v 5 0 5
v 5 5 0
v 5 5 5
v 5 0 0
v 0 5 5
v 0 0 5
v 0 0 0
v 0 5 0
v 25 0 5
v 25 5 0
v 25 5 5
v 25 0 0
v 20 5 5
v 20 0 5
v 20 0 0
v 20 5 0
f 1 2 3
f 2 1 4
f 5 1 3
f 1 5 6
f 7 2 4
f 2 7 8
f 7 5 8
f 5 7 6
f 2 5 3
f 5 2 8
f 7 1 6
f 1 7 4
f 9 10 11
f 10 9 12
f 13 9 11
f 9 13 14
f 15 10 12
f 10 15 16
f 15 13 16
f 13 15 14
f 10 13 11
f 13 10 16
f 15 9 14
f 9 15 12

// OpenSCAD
// Two bodies which do not touch. A CLOSED_SHELL has to be a single connected
// shell, so these have to end up as one MANIFOLD_SOLID_BREP each instead of
// being stuffed into one shell that can never close.
//
// Measured, and asserted by the driver: what the exporter has to report for
// the above to have happened. A silently faceted export is still a valid one,
// so validity alone cannot see a recogniser that has stopped recognising.
// Nothing curved is declared, as with step-cube. The plane count is eight
// rather than twelve, and that is this fixture's own arithmetic: the two boxes
// have the same extent in y and z and differ only along x, so their y = 0,
// y = 5, z = 0 and z = 5 faces lie in the same four planes and are one record
// each - Surface::sameAs compares a plane by the plane, not by the point it was
// anchored at. Four x planes at 0, 5, 20 and 25 and four shared ones is eight.
// EXPECT: 0 analytic surfaces available (0 cylindrical, 0 spherical, 0 toroidal, 0 Bezier), and 8 declared planes
//
// Two 5mm cubes, 125 each. The figure is what says both bodies survived: lose
// one and the kernel still reads a valid solid, of half the volume.
// ROUNDTRIP: Plane=12
// VOLUME: 250
cube([5, 5, 5]);
translate([20, 0, 0]) cube([5, 5, 5]);
